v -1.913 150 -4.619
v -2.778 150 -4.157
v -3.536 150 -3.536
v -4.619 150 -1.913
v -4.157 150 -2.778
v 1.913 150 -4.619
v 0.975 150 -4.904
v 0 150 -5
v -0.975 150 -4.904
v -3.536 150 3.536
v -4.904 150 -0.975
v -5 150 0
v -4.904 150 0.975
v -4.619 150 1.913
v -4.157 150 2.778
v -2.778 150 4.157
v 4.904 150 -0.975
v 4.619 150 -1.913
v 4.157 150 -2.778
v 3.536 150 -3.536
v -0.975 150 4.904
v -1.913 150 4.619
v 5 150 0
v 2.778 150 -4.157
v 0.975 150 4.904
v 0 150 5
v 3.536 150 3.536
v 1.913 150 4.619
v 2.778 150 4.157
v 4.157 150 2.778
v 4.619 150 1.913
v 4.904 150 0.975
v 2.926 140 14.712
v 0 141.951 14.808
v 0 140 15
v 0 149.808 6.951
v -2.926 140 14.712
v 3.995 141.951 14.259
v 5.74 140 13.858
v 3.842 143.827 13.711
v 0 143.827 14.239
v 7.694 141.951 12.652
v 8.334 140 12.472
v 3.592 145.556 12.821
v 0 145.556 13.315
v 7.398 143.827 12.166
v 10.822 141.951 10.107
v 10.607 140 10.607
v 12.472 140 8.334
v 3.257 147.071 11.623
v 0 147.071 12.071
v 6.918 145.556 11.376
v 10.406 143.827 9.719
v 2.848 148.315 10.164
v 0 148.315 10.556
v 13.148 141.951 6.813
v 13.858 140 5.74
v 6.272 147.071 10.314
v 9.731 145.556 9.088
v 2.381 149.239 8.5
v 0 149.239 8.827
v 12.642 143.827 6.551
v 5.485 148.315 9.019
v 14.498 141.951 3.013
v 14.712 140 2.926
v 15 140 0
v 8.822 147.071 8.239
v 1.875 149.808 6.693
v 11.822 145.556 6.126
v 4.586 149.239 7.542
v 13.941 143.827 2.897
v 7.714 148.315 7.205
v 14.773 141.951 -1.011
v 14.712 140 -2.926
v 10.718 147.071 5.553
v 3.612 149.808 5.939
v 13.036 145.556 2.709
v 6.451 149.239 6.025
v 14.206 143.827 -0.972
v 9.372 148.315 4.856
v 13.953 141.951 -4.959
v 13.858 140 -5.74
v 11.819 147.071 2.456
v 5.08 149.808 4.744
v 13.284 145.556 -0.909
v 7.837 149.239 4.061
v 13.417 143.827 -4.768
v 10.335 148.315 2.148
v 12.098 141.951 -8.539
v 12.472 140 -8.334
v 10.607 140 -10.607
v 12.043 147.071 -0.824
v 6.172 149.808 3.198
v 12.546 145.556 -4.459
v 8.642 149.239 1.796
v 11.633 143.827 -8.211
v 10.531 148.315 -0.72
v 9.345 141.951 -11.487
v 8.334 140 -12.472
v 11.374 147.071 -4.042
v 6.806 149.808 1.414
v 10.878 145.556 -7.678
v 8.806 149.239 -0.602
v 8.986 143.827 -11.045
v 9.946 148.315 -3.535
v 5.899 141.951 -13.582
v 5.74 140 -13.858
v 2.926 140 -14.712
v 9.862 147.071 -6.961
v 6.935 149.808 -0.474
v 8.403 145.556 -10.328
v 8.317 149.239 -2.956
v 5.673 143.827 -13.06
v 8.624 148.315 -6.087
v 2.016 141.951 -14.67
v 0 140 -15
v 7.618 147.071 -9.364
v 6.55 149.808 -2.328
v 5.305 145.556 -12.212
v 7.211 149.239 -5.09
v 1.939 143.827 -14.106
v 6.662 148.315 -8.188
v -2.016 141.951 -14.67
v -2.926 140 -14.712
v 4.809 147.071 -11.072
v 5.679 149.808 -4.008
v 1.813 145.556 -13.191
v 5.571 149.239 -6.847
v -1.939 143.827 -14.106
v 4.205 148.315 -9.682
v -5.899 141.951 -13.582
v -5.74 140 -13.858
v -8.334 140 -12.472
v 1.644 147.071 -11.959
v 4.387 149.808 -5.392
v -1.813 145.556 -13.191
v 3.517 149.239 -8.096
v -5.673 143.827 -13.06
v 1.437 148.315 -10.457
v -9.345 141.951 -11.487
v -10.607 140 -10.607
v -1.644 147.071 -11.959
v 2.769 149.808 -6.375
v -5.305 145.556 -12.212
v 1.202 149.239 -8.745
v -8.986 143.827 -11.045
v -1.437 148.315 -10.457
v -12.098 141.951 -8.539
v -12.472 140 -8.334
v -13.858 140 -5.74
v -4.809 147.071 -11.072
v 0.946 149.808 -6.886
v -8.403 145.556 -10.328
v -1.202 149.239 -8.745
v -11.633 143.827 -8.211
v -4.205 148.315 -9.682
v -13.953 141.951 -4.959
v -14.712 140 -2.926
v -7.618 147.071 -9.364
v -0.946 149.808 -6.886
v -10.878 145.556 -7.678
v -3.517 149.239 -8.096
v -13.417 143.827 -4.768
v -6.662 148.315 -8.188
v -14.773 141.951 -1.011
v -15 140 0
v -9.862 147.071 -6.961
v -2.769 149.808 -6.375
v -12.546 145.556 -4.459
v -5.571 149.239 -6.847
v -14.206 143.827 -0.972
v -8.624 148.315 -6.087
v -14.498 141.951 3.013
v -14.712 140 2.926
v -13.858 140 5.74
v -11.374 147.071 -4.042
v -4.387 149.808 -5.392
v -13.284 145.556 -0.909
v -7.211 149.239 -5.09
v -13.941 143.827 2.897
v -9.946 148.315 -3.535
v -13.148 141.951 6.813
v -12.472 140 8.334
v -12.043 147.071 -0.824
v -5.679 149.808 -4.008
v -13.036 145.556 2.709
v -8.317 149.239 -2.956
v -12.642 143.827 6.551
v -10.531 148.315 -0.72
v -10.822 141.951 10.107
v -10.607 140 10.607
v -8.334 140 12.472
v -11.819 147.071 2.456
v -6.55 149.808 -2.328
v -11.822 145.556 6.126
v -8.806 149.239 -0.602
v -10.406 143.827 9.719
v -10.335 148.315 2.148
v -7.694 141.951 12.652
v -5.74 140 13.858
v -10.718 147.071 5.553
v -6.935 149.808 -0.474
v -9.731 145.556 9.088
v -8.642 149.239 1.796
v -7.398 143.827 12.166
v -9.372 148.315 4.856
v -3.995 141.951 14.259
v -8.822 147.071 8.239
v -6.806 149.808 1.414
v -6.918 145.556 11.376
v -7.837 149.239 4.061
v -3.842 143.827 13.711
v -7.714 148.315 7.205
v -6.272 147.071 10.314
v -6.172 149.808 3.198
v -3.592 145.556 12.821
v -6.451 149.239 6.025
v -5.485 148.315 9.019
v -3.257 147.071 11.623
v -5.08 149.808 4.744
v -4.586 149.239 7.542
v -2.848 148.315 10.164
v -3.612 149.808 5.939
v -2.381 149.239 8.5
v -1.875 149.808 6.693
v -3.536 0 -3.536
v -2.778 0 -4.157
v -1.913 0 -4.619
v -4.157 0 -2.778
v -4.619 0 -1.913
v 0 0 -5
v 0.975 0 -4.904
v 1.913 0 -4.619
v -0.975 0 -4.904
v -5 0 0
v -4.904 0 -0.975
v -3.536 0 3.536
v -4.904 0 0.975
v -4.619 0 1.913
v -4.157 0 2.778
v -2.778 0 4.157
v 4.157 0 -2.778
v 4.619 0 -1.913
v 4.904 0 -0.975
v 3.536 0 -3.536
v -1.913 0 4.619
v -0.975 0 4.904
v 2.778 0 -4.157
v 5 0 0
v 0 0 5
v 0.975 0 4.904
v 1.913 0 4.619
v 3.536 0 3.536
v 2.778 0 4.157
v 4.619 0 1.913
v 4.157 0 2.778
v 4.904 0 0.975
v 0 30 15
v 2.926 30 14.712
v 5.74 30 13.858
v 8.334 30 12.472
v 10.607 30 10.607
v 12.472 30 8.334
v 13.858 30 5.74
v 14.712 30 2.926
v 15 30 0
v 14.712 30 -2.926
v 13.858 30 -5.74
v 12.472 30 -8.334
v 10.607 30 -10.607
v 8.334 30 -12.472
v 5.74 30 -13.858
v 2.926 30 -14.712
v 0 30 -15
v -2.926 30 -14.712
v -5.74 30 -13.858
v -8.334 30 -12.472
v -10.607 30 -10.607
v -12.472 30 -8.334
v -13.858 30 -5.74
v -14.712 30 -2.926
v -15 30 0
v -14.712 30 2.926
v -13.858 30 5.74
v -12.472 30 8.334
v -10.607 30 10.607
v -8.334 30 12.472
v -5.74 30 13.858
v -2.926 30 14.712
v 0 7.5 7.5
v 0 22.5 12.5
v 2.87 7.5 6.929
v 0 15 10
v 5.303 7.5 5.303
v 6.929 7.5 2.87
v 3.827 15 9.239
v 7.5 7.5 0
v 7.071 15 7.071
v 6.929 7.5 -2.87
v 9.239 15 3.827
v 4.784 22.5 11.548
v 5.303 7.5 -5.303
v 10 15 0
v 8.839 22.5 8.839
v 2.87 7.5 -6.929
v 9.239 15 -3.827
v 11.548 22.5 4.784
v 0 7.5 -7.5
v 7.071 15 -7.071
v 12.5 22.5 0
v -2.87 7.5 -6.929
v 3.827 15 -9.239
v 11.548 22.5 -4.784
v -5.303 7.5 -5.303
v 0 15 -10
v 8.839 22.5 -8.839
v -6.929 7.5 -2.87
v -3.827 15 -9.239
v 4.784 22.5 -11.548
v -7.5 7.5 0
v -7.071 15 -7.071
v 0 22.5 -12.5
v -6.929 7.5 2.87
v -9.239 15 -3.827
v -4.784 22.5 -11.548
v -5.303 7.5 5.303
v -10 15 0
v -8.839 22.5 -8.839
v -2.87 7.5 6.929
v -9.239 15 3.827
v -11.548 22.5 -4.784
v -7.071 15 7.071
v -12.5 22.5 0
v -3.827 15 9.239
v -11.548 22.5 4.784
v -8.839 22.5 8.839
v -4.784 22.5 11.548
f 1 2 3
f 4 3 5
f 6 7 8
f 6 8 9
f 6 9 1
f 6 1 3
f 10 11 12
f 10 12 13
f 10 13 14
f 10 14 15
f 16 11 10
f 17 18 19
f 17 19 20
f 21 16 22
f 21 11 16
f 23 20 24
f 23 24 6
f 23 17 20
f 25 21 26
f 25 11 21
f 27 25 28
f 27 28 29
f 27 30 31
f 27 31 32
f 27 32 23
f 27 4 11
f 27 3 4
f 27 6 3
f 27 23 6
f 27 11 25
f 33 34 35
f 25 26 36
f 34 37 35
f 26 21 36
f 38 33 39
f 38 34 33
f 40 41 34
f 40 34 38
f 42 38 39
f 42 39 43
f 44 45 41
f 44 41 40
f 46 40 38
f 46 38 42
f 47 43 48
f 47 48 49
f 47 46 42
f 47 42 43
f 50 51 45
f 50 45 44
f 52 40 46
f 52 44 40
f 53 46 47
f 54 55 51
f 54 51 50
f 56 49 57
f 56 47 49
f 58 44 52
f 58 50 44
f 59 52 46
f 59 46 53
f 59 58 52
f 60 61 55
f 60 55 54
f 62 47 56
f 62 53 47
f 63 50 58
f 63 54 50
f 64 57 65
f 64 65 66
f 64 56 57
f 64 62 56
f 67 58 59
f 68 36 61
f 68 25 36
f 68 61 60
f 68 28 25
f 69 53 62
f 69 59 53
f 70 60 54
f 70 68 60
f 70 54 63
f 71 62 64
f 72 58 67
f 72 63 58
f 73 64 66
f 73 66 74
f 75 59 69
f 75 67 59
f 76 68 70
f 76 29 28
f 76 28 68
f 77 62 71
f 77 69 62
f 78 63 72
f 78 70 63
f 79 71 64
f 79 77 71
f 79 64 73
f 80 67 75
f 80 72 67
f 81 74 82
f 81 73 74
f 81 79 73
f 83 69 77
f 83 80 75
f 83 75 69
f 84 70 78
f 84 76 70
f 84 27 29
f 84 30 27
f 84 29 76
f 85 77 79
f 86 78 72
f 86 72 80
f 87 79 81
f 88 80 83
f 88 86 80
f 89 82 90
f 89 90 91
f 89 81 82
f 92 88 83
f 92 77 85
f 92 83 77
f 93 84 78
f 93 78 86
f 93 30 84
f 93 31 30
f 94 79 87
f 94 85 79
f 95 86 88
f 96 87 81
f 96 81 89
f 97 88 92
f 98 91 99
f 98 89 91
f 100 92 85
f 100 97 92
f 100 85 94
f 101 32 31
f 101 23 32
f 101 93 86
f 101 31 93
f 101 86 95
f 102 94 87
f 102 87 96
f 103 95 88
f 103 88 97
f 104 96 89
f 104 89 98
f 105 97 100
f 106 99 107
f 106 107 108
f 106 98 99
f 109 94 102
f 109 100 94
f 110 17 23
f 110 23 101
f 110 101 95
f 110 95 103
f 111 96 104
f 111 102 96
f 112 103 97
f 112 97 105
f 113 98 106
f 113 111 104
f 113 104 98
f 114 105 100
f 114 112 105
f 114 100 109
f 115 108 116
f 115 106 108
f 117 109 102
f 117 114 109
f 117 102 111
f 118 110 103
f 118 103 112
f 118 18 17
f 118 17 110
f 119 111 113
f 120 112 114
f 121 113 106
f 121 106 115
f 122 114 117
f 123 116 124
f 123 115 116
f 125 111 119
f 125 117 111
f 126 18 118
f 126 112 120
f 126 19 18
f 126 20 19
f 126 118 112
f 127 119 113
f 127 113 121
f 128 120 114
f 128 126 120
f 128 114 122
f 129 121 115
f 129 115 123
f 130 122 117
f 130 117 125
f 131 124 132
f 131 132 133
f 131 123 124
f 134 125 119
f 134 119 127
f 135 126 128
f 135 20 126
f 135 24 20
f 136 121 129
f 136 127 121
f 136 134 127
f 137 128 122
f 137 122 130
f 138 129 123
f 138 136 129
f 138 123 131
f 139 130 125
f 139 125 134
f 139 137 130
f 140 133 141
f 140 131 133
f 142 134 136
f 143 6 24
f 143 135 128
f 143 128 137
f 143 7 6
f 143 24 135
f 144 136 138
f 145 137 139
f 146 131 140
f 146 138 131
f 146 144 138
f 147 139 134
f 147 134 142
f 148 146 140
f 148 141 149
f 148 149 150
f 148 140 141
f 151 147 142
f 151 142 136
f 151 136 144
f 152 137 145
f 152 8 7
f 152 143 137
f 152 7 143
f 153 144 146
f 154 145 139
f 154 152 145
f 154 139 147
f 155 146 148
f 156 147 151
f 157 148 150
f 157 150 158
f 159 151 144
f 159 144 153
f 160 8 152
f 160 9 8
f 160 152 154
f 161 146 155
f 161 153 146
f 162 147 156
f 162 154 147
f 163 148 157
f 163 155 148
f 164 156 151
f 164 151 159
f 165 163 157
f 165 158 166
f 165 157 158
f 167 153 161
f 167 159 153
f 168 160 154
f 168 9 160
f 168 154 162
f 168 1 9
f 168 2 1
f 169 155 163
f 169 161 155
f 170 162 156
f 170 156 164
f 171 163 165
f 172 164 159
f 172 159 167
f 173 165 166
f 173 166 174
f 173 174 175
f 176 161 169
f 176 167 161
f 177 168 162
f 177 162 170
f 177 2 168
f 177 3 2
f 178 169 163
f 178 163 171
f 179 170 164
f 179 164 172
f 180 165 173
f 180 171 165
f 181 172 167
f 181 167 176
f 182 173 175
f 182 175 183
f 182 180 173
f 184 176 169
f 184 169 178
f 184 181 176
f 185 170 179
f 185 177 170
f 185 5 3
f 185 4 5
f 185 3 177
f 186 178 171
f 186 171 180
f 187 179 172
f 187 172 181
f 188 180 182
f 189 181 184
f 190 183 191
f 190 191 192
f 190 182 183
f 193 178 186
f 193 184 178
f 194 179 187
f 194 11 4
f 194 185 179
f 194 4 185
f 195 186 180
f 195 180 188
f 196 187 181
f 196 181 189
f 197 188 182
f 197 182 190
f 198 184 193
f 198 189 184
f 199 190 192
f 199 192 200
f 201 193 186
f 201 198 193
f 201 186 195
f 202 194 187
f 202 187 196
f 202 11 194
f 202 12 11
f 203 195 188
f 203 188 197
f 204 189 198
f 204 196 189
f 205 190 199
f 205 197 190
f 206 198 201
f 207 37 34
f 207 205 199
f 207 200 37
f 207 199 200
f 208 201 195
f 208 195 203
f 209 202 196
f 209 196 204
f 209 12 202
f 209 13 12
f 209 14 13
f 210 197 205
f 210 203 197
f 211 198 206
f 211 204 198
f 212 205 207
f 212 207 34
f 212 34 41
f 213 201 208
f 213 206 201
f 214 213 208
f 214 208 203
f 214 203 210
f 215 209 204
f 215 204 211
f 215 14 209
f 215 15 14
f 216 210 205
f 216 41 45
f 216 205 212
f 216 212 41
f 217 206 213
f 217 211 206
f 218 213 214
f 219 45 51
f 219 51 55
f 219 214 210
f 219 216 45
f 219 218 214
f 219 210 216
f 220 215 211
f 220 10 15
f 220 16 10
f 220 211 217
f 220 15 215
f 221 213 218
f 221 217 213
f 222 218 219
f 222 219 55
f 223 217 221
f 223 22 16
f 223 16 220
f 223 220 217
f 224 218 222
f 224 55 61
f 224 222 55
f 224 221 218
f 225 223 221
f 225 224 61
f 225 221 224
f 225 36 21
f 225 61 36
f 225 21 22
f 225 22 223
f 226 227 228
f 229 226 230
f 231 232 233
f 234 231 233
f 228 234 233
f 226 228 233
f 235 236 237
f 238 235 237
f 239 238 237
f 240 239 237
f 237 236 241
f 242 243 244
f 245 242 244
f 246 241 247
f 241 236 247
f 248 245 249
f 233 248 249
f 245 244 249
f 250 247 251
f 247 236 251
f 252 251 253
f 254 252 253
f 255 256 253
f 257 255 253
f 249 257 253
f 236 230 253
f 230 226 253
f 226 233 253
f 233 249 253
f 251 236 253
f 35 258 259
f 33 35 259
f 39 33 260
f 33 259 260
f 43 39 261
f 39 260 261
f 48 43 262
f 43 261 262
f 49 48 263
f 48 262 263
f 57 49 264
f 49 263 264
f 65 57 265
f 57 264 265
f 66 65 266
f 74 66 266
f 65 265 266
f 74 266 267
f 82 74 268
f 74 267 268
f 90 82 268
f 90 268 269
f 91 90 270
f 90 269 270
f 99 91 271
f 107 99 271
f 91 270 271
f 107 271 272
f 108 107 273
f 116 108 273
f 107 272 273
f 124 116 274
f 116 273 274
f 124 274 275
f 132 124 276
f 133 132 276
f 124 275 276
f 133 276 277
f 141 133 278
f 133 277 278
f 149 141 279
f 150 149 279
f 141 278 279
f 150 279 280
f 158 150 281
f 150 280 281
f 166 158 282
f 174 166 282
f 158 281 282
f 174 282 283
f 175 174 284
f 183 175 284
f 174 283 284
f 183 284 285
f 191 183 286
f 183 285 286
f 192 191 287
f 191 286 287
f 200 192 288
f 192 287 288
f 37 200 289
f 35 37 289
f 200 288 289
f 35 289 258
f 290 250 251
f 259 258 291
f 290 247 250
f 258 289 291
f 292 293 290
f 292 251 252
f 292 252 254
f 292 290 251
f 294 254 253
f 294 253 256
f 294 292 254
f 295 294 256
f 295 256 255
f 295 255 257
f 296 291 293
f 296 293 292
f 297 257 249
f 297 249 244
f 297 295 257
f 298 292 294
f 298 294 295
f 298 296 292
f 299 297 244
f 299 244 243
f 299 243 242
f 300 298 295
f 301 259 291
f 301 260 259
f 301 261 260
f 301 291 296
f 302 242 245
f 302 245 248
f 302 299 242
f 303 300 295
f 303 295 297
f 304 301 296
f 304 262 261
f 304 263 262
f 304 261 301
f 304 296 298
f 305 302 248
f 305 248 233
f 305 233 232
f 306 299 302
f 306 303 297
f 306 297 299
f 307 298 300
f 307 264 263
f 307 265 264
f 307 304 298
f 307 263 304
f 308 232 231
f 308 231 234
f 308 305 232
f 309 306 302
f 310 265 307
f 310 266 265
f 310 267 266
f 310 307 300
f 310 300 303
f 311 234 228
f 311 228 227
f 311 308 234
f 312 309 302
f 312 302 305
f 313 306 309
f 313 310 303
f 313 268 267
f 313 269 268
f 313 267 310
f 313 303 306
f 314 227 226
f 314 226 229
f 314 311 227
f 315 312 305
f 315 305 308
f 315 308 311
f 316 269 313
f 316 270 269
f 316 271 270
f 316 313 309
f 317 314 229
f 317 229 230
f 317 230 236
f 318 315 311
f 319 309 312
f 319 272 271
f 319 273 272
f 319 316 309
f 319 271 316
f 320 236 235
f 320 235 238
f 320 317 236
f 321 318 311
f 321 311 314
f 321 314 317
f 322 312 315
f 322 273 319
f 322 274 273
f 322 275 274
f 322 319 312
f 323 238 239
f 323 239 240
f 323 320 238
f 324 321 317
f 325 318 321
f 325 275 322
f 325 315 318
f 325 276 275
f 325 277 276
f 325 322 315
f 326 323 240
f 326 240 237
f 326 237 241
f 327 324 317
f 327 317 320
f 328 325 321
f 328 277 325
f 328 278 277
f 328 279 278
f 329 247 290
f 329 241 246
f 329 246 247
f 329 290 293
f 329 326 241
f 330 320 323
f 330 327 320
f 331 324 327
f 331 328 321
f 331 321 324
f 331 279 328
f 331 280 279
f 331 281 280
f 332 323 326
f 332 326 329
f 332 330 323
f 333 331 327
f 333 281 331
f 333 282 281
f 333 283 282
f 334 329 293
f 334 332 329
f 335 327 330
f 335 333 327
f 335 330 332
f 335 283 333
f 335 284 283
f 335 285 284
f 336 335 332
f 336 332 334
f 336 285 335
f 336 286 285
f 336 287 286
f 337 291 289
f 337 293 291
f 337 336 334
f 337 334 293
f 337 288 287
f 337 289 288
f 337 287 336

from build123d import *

# Parameters (mm, degrees)
CROQUIS1_R              = 15
SALIENTE_EXTRUIR1_DEPTH = 150
REDONDEO5_R             = 10
CHAFL_N2_SIZE           = 10
CHAFL_N2_SIZE2          = 30


with BuildPart() as part:
    # Croquis1 → Saliente-Extruir1 (new body)
    with BuildSketch(Plane(origin=(0, 0, 0), x_dir=(1, 0, 0), z_dir=(0, 1, 0))):
        with Locations(Location((0, 0, 0), (0, 0, 270))):
            Circle(CROQUIS1_R)
    extrude(amount=SALIENTE_EXTRUIR1_DEPTH)

    # Redondeo5
    redondeo5_edges = [part.edges().sort_by_distance(p)[0] for p in [
        (0, 150, -15),
    ]]
    fillet(redondeo5_edges, radius=REDONDEO5_R)

    # Chaflán2
    chafl_n2_edges = [part.edges().sort_by_distance(p)[0] for p in [
        (0, 0, -15),
    ]]
    chafl_n2_side = [part.faces().sort_by_distance(p)[0] for p in [
        (0, 0, 0),
    ]]
    chamfer(chafl_n2_edges, length=CHAFL_N2_SIZE, length2=CHAFL_N2_SIZE2, reference=chafl_n2_side[0])


solid = part.part
